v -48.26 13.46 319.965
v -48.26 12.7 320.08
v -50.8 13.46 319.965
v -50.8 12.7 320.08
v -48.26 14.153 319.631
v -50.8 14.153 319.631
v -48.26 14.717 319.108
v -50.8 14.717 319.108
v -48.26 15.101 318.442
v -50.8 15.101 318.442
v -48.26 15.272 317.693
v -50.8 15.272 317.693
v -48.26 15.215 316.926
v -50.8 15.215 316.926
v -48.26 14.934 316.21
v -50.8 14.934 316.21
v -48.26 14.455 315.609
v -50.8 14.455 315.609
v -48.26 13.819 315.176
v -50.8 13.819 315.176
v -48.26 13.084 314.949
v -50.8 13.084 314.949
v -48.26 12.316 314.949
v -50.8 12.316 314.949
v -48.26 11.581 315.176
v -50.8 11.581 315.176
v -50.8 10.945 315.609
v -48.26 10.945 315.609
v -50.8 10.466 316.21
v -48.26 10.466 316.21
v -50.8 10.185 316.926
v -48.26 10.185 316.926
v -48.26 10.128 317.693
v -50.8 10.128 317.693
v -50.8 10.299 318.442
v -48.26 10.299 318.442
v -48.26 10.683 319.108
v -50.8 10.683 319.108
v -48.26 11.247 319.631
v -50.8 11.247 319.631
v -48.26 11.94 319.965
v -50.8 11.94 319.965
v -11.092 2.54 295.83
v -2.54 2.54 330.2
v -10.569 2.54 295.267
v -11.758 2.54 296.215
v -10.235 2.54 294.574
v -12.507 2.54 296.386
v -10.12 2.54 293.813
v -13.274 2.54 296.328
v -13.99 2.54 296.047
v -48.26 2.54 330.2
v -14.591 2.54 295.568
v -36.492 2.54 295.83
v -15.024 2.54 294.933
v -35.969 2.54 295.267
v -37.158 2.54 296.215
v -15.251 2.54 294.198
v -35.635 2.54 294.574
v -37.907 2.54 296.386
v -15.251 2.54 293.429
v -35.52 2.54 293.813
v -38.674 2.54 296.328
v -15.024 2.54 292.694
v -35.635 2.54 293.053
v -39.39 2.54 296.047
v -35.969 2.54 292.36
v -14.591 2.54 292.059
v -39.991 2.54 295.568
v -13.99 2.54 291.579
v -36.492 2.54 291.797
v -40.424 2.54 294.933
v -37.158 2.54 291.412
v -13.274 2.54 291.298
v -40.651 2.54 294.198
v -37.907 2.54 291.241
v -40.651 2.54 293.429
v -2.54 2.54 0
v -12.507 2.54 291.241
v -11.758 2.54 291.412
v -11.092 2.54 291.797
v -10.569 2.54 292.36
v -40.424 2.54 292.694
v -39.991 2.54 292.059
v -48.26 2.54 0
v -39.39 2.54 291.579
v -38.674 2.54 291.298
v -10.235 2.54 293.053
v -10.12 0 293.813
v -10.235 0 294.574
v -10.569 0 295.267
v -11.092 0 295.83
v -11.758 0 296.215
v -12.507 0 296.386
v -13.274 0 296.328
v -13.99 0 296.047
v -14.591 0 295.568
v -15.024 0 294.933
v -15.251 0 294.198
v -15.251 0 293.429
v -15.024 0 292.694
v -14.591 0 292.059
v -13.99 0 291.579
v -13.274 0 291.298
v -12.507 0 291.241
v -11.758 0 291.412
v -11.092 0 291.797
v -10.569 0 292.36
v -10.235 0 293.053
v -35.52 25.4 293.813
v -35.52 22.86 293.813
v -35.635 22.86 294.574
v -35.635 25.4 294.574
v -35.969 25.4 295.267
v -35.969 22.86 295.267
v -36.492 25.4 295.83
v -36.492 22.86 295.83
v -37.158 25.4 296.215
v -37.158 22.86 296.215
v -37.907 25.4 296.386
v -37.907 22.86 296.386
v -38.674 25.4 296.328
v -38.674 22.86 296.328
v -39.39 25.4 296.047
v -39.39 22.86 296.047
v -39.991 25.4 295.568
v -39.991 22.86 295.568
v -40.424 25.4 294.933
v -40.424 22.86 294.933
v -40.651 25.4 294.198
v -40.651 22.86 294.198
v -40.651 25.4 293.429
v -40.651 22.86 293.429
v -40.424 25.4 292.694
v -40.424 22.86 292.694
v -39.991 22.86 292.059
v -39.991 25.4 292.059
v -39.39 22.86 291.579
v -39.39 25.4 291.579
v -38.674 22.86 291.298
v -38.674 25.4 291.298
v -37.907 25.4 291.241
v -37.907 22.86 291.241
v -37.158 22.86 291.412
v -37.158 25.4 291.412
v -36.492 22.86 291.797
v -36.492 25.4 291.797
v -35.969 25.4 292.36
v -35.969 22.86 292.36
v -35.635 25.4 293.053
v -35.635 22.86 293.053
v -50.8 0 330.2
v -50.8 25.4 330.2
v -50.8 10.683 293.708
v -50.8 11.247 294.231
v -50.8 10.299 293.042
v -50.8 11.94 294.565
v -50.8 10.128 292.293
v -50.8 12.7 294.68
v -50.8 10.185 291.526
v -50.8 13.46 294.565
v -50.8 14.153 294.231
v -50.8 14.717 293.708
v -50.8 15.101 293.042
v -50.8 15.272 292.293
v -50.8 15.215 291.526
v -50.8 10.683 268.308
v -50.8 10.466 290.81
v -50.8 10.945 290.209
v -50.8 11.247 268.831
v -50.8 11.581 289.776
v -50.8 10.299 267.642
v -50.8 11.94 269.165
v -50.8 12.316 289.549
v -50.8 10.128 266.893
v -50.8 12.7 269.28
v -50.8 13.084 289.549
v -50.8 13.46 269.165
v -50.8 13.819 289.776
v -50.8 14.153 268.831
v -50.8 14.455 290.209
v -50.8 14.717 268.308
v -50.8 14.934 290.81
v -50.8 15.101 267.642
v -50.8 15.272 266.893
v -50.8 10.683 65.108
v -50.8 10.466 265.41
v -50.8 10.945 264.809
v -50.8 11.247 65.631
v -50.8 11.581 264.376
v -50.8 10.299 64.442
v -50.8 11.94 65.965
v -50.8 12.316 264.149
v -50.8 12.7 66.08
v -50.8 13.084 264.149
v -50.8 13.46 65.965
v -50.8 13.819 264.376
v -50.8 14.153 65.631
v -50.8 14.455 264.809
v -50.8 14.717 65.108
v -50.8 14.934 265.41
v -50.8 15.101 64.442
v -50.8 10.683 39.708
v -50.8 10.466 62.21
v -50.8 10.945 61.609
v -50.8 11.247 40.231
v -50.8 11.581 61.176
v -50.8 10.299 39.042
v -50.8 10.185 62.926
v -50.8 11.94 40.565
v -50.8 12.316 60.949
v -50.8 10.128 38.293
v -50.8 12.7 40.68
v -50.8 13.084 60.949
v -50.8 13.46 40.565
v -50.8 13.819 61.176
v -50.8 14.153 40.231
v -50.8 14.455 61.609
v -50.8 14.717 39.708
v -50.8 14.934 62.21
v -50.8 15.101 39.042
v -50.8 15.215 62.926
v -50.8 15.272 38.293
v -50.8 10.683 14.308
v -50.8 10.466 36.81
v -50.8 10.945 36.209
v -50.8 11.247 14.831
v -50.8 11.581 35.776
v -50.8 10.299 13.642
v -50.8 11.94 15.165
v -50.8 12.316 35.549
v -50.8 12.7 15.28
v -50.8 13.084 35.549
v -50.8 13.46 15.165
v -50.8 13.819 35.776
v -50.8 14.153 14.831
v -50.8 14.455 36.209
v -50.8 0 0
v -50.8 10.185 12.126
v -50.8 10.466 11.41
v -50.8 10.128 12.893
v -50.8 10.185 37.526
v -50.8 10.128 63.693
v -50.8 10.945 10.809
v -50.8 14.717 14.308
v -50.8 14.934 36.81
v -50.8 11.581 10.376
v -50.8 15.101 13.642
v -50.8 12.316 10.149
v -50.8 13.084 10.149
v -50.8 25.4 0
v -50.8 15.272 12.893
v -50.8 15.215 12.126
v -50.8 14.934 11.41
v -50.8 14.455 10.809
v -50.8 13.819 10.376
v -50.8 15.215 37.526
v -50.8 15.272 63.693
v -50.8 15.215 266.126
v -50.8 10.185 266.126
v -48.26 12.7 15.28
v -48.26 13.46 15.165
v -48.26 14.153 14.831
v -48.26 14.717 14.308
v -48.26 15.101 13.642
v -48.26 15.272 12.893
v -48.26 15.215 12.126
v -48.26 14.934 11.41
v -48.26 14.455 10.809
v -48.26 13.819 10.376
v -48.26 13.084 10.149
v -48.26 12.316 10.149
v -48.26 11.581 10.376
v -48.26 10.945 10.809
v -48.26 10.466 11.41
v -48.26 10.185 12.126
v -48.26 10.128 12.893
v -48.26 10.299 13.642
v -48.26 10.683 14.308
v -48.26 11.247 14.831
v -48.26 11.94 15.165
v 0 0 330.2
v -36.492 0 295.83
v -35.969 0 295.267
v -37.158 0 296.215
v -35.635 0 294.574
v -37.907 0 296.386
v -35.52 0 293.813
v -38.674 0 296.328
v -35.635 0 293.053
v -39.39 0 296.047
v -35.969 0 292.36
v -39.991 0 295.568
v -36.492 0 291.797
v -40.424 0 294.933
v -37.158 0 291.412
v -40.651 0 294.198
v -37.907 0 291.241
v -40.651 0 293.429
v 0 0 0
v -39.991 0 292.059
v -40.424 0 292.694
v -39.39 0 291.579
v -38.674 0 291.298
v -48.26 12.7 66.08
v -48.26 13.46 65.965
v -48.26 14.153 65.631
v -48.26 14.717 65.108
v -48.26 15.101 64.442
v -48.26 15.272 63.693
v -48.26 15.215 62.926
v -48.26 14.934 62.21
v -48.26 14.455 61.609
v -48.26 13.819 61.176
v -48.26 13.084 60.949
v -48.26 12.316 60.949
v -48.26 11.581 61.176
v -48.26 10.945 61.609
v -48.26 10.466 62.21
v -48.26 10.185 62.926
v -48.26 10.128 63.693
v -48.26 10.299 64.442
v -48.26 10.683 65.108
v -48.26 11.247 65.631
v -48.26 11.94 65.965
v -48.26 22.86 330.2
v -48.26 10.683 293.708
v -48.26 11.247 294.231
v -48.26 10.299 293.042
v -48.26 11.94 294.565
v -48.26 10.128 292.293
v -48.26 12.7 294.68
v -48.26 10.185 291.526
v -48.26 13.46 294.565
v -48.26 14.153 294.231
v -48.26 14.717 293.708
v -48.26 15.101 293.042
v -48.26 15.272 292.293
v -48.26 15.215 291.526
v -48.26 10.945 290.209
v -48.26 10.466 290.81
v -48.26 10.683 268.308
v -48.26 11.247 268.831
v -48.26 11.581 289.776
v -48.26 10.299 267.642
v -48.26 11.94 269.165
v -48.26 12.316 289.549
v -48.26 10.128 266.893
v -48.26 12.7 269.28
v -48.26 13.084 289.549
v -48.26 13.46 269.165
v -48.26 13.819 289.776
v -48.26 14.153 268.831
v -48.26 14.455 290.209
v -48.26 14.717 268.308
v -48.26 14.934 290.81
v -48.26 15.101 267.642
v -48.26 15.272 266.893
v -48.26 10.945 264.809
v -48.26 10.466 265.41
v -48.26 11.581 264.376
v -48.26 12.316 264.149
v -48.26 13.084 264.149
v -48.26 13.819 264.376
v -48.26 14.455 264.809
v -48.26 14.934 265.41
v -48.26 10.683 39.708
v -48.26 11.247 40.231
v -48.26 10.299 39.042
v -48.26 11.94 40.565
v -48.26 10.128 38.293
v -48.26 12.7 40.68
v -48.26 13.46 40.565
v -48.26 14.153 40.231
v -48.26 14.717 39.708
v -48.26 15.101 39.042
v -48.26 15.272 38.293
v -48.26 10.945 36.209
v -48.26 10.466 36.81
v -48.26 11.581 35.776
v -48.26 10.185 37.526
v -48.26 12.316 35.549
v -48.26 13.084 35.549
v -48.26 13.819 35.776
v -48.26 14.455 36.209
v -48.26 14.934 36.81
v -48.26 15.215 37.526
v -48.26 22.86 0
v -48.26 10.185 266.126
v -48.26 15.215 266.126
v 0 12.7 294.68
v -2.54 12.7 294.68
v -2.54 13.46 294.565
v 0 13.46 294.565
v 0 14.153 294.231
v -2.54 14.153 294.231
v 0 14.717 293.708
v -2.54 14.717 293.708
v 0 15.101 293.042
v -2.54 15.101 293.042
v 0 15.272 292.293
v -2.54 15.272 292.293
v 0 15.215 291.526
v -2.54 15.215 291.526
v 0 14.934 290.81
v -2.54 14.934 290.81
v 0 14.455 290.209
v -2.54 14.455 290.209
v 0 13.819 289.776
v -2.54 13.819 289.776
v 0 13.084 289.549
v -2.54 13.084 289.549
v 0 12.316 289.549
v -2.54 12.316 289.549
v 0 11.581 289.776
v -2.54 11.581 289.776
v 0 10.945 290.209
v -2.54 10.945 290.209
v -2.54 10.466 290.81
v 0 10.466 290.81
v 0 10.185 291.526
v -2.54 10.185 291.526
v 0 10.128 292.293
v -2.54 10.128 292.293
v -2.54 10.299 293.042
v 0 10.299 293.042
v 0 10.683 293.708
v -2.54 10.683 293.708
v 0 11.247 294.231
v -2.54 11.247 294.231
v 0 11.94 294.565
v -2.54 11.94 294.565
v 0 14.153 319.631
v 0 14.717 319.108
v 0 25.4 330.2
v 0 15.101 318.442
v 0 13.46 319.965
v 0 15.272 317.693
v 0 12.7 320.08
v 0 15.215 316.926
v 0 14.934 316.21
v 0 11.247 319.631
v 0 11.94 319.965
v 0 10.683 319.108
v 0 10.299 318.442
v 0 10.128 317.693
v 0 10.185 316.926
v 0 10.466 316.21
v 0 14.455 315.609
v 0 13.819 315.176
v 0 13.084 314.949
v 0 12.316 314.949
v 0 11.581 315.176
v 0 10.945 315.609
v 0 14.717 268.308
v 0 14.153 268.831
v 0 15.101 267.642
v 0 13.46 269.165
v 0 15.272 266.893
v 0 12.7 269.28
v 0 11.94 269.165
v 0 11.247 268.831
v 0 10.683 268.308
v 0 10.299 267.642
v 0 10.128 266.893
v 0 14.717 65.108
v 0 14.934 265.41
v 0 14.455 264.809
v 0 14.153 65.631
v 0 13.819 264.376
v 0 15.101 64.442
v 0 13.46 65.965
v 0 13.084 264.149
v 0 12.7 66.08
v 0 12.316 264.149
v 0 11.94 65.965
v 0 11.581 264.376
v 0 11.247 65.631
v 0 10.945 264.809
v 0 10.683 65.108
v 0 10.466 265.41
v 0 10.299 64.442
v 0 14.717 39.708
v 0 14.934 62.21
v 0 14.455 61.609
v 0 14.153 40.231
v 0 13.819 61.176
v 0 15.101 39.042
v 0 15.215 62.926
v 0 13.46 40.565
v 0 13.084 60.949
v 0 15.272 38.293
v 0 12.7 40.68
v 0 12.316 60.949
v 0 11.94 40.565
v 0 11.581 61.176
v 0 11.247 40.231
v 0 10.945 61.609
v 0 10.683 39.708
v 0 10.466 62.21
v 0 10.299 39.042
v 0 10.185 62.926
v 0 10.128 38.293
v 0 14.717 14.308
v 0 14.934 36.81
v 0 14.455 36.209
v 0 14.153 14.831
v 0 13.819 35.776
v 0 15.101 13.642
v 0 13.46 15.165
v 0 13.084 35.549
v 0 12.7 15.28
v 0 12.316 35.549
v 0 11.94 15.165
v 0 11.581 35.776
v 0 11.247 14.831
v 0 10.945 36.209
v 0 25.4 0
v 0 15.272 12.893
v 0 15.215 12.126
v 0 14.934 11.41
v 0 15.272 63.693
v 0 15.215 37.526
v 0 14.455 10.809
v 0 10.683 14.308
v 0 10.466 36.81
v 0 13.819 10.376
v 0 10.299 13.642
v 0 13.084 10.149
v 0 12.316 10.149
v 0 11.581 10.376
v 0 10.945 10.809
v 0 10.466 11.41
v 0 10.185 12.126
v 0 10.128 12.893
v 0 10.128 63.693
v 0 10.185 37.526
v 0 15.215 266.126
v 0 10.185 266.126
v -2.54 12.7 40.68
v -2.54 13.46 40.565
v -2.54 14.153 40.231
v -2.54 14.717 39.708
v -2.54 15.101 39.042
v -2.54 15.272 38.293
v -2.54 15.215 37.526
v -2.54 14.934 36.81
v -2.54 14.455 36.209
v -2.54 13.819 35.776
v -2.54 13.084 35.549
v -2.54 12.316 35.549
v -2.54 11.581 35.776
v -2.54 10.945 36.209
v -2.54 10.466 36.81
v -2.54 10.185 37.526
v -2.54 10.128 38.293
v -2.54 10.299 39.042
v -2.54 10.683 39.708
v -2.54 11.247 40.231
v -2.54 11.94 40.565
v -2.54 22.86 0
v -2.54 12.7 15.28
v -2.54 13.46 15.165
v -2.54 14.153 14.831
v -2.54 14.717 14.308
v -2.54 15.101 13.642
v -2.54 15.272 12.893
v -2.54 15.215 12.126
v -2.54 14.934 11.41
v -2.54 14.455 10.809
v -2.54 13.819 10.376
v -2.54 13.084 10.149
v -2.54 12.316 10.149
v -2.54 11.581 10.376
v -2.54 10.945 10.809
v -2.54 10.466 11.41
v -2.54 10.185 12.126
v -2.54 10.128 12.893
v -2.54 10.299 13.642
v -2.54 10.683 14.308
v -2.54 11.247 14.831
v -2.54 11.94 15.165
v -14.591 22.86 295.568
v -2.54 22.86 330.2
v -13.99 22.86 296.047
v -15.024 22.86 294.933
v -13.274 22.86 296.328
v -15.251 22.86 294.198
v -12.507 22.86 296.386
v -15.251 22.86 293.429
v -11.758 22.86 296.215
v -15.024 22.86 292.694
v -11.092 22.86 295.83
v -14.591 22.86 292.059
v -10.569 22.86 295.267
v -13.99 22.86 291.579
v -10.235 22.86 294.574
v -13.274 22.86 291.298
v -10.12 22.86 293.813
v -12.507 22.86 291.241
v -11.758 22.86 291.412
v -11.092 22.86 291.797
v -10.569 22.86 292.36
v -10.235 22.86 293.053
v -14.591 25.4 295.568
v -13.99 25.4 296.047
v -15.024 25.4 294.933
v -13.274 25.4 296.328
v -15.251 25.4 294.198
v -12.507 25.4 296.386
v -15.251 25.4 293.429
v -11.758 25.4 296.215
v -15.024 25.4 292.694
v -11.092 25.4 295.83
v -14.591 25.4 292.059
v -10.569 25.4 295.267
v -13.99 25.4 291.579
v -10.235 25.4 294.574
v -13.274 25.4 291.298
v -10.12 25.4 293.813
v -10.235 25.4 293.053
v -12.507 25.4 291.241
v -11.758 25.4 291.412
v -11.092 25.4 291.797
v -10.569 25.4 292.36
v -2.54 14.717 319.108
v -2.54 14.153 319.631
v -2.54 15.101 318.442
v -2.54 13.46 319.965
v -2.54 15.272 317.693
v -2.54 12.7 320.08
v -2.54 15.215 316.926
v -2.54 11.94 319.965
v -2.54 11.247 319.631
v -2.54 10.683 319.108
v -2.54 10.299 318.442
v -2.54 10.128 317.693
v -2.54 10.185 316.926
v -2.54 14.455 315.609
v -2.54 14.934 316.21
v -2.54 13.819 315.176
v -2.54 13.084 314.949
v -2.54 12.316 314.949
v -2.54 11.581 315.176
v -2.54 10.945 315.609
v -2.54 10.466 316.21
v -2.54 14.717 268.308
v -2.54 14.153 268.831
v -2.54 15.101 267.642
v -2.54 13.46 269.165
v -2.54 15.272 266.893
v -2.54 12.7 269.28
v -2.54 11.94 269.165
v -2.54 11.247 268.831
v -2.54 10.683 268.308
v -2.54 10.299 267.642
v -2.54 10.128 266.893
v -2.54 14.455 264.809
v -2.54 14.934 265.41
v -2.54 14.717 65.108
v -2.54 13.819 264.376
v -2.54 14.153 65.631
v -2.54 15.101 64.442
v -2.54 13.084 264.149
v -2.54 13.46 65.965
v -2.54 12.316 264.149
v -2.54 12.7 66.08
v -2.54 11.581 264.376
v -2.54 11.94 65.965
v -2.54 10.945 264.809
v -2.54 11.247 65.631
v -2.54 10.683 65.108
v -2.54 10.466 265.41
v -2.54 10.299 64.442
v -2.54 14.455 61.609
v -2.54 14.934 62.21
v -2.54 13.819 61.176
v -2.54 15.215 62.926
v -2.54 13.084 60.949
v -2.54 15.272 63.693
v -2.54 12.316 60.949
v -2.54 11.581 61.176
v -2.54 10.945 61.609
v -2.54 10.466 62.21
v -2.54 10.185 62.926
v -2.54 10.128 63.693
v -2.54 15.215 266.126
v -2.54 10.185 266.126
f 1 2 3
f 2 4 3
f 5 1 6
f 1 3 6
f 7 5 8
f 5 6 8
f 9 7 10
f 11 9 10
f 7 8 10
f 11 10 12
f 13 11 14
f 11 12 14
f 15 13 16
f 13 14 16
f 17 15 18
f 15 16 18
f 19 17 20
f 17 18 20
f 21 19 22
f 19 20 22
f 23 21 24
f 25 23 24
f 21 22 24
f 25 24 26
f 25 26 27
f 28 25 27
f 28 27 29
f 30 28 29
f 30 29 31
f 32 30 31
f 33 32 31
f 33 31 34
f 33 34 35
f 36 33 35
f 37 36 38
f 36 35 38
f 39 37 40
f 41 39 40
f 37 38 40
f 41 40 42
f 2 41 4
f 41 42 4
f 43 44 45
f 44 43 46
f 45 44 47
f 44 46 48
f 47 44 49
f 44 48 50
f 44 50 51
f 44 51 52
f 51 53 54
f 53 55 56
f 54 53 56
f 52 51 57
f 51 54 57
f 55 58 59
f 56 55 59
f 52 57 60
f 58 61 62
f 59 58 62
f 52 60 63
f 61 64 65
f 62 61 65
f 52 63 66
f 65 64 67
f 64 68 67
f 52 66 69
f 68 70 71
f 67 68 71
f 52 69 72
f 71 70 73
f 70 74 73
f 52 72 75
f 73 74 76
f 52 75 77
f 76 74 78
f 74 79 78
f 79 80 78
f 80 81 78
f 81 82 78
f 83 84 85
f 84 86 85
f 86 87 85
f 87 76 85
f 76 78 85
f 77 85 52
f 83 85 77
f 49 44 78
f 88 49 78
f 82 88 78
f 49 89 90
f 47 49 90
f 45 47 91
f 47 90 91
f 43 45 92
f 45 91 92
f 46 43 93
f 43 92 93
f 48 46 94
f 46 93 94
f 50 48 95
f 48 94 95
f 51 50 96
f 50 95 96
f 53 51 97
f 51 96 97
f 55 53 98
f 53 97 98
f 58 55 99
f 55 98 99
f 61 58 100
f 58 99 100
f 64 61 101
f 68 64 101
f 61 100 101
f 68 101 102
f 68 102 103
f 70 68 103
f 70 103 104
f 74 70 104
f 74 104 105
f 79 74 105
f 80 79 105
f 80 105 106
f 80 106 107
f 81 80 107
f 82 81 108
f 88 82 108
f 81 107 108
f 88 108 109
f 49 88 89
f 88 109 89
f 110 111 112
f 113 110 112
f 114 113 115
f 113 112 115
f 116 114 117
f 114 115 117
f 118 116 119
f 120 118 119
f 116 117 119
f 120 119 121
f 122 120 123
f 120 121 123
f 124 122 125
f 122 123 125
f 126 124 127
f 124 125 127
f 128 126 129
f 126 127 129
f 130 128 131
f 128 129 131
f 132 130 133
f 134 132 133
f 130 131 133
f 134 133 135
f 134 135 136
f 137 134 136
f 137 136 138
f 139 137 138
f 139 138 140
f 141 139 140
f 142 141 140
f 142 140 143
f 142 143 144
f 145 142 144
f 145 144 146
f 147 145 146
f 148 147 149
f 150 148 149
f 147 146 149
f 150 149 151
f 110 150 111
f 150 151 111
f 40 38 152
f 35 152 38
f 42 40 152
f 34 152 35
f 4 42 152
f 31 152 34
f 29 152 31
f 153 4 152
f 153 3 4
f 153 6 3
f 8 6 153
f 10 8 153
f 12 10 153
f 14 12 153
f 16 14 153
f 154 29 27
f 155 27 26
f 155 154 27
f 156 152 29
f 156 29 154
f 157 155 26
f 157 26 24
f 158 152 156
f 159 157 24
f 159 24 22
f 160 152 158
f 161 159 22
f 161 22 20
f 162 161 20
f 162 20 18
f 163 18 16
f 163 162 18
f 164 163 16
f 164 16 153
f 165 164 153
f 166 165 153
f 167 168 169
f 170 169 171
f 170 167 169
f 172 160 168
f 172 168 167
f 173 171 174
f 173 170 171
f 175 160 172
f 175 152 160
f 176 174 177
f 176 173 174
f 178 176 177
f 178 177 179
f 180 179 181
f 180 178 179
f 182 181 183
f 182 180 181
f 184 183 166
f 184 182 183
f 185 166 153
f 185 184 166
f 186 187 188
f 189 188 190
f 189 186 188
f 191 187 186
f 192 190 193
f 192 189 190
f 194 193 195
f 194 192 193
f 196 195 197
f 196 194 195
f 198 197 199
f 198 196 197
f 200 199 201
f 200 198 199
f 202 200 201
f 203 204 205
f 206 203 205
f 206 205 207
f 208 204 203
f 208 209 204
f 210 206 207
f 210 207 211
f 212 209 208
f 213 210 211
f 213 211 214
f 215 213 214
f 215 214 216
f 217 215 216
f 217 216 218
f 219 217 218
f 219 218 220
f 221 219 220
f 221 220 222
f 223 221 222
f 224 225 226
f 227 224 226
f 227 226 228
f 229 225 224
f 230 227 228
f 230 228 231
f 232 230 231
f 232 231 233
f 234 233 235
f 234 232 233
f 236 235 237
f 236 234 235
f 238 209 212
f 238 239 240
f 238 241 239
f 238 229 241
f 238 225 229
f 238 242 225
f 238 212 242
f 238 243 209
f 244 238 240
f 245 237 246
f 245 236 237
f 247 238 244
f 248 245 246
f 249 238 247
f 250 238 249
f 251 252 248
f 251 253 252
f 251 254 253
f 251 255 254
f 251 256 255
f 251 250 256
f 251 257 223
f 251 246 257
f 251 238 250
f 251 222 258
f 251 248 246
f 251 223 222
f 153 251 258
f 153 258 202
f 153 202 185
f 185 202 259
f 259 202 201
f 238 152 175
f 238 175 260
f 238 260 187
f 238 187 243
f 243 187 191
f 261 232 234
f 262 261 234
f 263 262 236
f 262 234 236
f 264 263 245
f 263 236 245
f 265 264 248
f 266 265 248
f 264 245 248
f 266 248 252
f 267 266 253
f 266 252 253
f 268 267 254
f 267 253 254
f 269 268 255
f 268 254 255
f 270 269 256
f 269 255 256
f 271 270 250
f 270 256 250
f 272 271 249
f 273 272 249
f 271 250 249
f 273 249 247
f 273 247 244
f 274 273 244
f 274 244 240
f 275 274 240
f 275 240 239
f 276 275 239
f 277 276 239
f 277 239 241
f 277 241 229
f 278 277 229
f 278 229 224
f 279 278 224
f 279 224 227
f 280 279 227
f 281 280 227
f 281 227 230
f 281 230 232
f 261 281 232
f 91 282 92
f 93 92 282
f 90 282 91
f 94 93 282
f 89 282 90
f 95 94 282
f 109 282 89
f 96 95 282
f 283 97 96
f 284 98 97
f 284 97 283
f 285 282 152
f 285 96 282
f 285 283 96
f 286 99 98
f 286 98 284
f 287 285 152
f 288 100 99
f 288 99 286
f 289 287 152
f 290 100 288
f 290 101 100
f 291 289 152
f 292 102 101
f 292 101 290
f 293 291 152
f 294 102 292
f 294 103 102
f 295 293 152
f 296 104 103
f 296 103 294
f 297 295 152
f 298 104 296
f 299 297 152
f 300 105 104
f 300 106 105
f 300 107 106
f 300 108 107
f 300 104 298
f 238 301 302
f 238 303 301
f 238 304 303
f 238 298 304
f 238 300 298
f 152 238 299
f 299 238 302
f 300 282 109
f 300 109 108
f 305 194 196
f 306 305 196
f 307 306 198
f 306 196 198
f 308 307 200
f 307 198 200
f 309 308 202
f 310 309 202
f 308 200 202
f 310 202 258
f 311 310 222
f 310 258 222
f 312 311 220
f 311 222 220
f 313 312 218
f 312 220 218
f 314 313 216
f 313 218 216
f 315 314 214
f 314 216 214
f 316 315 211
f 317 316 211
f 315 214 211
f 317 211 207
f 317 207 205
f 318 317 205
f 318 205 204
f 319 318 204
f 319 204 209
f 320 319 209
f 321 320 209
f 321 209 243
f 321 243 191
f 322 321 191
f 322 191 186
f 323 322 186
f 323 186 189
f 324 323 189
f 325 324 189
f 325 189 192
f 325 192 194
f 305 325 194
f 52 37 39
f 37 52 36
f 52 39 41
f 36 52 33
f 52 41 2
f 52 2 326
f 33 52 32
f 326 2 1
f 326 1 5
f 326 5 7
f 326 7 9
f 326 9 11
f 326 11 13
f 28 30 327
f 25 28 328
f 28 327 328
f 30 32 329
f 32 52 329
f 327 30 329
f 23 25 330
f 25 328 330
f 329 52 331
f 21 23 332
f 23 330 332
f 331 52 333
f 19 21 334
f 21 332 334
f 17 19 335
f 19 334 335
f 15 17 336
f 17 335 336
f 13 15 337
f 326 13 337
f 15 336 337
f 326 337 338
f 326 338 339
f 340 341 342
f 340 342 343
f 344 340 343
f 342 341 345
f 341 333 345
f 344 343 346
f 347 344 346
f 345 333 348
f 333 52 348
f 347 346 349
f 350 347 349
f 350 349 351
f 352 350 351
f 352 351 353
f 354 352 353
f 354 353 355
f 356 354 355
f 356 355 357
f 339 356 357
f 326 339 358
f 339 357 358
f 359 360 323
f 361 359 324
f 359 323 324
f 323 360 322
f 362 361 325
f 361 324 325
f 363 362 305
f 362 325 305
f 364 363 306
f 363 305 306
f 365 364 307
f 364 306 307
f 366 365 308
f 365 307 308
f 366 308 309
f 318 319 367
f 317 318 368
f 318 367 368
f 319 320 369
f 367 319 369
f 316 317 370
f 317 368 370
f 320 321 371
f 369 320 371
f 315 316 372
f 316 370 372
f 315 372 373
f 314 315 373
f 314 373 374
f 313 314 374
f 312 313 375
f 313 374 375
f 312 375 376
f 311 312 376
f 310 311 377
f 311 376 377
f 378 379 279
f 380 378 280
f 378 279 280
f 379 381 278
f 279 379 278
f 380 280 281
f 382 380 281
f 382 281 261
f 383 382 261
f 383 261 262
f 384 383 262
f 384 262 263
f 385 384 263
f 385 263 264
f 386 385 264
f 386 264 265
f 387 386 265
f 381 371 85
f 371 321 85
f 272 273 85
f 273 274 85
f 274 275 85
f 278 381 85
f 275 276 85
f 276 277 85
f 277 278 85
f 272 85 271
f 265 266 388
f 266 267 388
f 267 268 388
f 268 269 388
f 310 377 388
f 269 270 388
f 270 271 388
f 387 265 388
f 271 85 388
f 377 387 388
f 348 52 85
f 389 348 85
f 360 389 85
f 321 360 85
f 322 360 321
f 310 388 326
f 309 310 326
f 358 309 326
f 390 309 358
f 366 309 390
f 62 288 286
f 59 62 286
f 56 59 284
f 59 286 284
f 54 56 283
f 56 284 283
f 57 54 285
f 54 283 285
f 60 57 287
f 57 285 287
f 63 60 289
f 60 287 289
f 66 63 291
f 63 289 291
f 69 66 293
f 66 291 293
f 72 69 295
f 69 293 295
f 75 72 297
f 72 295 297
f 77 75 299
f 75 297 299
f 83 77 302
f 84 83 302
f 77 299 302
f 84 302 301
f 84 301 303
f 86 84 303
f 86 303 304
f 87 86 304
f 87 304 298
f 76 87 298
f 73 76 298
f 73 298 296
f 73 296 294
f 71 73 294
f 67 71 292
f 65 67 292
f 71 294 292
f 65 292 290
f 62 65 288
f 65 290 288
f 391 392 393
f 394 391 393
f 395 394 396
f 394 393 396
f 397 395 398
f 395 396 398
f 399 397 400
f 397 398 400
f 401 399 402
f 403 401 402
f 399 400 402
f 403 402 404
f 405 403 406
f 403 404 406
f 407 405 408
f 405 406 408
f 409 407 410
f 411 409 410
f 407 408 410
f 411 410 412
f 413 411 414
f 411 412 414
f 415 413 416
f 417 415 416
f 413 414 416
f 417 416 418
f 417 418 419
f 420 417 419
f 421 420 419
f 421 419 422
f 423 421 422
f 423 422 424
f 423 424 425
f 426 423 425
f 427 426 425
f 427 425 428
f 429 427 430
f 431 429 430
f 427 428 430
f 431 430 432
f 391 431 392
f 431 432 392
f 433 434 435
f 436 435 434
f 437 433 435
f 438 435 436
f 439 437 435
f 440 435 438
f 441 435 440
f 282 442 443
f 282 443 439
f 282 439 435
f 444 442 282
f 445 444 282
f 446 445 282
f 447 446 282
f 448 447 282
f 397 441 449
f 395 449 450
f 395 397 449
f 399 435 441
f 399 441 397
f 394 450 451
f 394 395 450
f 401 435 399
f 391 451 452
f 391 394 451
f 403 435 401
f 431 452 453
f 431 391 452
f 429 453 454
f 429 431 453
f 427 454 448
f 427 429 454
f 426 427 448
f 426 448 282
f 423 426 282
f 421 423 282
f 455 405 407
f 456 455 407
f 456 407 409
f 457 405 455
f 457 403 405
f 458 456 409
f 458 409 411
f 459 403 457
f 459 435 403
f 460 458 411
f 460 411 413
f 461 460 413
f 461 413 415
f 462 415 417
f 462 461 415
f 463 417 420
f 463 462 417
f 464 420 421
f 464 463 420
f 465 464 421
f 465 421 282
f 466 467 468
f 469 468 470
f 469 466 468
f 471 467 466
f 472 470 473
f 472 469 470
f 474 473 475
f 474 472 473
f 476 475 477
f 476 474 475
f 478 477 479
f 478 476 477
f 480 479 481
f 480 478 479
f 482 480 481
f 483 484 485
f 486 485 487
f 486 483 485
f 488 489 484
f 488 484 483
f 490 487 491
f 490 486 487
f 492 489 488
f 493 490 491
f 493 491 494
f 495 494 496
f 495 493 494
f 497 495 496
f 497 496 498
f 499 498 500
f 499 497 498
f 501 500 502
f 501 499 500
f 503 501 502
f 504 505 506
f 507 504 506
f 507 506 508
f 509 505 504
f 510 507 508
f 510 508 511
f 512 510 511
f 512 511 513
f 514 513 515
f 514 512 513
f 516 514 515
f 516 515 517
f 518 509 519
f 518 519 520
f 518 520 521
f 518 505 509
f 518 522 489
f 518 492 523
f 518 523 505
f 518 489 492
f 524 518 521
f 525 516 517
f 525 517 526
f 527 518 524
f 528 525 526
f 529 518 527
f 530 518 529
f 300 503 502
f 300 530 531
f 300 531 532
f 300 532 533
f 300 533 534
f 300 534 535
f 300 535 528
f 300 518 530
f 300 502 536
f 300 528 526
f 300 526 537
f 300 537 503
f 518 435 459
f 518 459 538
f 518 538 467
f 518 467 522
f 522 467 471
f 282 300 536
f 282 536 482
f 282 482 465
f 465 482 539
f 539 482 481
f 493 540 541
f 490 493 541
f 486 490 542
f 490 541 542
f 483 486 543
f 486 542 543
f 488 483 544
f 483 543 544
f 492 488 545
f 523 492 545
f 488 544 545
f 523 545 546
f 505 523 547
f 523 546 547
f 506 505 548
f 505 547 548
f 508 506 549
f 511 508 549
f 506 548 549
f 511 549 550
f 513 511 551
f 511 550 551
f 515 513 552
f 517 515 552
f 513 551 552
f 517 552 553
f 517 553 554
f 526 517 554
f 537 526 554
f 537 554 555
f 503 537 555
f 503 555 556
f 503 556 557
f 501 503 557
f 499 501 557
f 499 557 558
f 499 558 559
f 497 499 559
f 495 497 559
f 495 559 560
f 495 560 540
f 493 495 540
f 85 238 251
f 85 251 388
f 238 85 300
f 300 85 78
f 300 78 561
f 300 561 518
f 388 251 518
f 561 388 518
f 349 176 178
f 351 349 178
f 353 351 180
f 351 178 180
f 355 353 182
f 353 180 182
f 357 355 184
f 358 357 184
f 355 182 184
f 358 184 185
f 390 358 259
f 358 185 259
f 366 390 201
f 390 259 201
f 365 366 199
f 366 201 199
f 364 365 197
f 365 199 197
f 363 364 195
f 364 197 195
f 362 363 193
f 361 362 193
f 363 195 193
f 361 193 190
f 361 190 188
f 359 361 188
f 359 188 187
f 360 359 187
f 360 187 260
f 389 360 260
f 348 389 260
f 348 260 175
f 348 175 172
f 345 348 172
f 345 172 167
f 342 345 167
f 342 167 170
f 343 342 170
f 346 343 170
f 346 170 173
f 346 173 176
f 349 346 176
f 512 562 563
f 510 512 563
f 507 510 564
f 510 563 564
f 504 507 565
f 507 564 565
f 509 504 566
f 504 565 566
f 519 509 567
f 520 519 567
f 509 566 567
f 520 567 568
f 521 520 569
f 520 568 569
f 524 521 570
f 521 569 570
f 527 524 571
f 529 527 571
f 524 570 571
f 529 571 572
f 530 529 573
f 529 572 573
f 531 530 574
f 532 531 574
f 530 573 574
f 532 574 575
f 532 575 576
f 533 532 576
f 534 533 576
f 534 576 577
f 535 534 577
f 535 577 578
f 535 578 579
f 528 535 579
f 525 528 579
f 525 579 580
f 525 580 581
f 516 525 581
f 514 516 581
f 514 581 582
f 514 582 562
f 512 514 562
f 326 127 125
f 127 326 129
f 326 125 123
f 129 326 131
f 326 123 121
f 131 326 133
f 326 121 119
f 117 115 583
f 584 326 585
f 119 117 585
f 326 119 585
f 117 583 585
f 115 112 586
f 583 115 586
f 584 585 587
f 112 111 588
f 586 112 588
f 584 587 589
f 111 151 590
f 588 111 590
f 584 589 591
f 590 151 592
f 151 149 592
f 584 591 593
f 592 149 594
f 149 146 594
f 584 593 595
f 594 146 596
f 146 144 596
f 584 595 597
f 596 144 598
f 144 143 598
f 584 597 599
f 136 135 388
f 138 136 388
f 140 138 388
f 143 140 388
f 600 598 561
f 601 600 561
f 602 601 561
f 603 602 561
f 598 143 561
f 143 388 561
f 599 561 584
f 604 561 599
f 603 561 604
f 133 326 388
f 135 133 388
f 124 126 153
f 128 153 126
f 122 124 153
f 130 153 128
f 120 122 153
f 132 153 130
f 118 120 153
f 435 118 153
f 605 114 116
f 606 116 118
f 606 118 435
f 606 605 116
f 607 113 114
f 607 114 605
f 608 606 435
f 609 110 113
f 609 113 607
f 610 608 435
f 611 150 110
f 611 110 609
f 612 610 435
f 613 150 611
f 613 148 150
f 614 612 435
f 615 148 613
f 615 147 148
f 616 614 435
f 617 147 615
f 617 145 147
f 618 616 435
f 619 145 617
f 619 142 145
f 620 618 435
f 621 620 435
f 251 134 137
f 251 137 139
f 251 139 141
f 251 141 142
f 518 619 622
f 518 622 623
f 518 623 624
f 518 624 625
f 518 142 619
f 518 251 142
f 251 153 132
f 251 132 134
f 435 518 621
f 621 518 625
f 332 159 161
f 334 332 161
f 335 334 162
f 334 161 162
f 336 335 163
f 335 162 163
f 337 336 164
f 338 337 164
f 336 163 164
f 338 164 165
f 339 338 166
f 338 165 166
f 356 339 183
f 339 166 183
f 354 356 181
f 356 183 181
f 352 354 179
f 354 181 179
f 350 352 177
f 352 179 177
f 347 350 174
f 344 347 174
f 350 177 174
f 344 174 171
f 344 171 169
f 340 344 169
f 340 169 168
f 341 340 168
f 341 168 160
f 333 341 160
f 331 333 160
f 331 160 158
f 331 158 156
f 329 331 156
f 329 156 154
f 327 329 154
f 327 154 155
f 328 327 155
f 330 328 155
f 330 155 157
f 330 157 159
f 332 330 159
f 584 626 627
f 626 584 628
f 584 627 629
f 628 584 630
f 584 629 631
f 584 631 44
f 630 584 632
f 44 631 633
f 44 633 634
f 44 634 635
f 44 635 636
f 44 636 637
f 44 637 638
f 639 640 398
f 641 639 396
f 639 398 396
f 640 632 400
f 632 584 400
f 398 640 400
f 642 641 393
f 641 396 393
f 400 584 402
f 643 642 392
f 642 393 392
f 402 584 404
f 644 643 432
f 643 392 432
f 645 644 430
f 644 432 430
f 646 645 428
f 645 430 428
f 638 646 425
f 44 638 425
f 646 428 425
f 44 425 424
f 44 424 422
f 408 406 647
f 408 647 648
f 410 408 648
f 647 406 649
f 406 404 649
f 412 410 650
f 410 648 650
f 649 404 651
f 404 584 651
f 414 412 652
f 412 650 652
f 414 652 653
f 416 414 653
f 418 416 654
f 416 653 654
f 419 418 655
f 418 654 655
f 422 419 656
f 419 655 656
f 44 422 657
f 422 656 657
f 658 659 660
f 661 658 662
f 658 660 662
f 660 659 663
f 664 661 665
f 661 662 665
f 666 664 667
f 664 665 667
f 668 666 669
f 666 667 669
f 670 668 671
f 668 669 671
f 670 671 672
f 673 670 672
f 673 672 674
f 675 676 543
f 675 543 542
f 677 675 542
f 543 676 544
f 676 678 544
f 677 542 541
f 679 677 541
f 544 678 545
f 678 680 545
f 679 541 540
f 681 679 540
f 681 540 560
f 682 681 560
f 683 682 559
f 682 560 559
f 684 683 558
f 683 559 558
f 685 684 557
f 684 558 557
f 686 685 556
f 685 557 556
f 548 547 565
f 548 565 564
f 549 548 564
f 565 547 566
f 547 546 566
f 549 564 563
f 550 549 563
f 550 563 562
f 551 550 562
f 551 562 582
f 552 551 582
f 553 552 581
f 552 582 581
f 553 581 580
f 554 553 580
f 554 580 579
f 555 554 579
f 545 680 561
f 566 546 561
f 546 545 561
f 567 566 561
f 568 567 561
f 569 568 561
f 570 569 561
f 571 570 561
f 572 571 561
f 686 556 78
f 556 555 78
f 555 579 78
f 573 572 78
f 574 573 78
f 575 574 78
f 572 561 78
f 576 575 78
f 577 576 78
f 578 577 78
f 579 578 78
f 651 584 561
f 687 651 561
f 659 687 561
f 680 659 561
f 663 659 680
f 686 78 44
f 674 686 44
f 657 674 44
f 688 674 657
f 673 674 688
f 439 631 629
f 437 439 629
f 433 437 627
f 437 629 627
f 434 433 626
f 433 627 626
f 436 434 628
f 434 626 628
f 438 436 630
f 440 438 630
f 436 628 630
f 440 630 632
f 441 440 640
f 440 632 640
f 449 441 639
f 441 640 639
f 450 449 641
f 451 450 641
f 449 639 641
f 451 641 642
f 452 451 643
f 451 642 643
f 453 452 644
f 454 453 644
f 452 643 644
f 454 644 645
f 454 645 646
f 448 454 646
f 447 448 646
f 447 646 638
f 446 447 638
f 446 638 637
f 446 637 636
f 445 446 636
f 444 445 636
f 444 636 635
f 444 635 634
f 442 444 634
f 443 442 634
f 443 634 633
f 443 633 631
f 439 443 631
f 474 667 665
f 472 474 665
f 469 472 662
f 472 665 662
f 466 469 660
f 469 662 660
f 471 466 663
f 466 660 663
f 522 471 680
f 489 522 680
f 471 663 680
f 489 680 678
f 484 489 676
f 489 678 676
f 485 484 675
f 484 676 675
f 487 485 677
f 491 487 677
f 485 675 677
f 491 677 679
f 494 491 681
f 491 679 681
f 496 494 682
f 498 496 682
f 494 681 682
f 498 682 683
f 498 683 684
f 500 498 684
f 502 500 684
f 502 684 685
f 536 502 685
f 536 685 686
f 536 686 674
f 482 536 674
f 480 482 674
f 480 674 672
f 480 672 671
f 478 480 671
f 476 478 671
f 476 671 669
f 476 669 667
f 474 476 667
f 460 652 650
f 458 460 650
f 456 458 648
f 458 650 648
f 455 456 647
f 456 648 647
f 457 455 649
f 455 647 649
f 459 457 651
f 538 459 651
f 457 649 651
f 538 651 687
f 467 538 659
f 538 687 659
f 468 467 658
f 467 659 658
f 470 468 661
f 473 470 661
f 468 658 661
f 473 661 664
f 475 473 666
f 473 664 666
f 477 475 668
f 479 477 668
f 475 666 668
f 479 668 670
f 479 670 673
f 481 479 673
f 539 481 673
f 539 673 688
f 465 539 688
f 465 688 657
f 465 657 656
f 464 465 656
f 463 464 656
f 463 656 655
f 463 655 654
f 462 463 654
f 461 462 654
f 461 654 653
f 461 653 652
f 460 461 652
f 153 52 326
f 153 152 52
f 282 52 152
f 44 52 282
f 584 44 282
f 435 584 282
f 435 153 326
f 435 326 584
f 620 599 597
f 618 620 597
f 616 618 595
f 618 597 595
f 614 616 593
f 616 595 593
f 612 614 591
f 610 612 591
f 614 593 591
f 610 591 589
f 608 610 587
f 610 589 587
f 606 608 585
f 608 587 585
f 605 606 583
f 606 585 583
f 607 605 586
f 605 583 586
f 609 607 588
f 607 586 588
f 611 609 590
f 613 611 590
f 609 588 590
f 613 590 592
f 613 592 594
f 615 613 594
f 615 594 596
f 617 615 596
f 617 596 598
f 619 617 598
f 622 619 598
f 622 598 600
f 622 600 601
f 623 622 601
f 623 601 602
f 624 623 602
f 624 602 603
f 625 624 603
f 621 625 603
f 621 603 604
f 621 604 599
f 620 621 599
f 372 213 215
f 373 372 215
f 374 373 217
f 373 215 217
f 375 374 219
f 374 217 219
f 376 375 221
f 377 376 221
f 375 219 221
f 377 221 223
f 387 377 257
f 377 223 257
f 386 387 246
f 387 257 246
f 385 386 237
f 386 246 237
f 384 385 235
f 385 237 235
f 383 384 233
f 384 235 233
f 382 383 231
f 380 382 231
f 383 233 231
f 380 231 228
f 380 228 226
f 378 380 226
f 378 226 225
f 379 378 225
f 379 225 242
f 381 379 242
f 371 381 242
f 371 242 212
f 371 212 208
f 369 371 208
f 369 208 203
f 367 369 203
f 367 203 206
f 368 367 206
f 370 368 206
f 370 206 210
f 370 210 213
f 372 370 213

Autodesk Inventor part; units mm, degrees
ref_plane "YZ Plane" through (0, 0, 0) normal (1, 0, 0) x (0, 1, 0)
ref_plane "XZ Plane" through (0, 0, 0) normal (0, 1, 0) x (-1, 0, 0)
ref_plane "XY Plane" through (0, 0, 0) normal (0, 0, 1) x (1, 0, 0)
sketch "Sketch1" plane through (0, 0, 0) normal (0, 0, 1) x (1, 0, 0)
  line L0 (0, 0) -> (-50.8, 0)
  line L1 (-50.8, 0) -> (-50.8, 25.4)
  line L2 (-50.8, 25.4) -> (0, 25.4)
  line L3 (0, 25.4) -> (0, 0)
  line L4 (-48.26, 22.86) -> (-2.54, 22.86)
  line L5 (-2.54, 22.86) -> (-2.54, 2.54)
  line L6 (-2.54, 2.54) -> (-48.26, 2.54)
  line L7 (-48.26, 2.54) -> (-48.26, 22.86)
  dimension "d0" = 25.4
  dimension "d1" = 50.8
  dimension "d2" = 2.54
  dimension "d3" = 2.54
  dimension "d4" = 2.54
  dimension "d5" = 2.54
extrude "Extrusion1" add sketch "Sketch1" along normal blind 330.2
sketch "Sketch2" plane through (-50.8, 0, 0) normal (-1, 0, 0) x (0, 0, 1)
  circle A0 centre (12.7, 12.7) radius 2.5797
  circle A1 centre (38.1, 12.7) radius 2.5797
  circle A2 centre (63.5, 12.7) radius 2.5797
  circle A3 centre (266.7, 12.7) radius 2.5797
  circle A4 centre (292.1, 12.7) radius 2.5797
  circle A5 centre (317.5, 12.7) radius 2.5797
  line L0 (0, 0) -> (0, 25.4) projected
  line L1 (330.2, 25.4) -> (330.2, 0) projected
  line L2 (0, 25.4) -> (330.2, 25.4) projected
  dimension "d8" = 12.7
  dimension "d9" = 25.4
  dimension "d10" = 25.4
  dimension "d11" = 25.4
  dimension "d12" = 25.4
  dimension "d13" = 12.7
  dimension "d14" = 5.1594
  dimension "d15" = 5.1594
  dimension "d16" = 5.1594
  dimension "d19" = 5.1594
  dimension "d20" = 5.1594
  dimension "d21" = 5.1594
  dimension "d22" = 12.7
  dimension "d23" = 12.7
  dimension "d24" = 12.7
  dimension "d25" = 12.7
  dimension "d26" = 12.7
  dimension "d27" = 12.7
extrude "Extrusion2" cut sketch "Sketch2" against normal blind 279.4
sketch "Sketch3" plane through (-50.8, 0, 0) normal (0, -1, 0) x (1, 0, 0)
  circle A0 centre (12.7, 293.8134) radius 2.5797
  circle A1 centre (38.1, 293.8134) radius 2.5797
  line L0 (0, 0) -> (0, 330.2) projected
  point P0 (50.8, 0)
  dimension "d30" = 5.1594
  dimension "d31" = 5.1594
  dimension "d32" = 12.7
  dimension "d33" = 25.4
extrude "Extrusion3" cut sketch "Sketch3" against normal blind 279.4
equation "\"d10\" = d9"
equation "\"d11\" = d9"
equation "\"d15\" = d14"
equation "\"d16\" = d14"
equation "\"d19\" = d14"
equation "\"d20\" = d14"
equation "\"d21\" = d14"
equation "\"d26\" = d25"
equation "\"d27\" = d25"
equation "\"d31\" = d30"
properties part number "ATACHMENT BAR"
